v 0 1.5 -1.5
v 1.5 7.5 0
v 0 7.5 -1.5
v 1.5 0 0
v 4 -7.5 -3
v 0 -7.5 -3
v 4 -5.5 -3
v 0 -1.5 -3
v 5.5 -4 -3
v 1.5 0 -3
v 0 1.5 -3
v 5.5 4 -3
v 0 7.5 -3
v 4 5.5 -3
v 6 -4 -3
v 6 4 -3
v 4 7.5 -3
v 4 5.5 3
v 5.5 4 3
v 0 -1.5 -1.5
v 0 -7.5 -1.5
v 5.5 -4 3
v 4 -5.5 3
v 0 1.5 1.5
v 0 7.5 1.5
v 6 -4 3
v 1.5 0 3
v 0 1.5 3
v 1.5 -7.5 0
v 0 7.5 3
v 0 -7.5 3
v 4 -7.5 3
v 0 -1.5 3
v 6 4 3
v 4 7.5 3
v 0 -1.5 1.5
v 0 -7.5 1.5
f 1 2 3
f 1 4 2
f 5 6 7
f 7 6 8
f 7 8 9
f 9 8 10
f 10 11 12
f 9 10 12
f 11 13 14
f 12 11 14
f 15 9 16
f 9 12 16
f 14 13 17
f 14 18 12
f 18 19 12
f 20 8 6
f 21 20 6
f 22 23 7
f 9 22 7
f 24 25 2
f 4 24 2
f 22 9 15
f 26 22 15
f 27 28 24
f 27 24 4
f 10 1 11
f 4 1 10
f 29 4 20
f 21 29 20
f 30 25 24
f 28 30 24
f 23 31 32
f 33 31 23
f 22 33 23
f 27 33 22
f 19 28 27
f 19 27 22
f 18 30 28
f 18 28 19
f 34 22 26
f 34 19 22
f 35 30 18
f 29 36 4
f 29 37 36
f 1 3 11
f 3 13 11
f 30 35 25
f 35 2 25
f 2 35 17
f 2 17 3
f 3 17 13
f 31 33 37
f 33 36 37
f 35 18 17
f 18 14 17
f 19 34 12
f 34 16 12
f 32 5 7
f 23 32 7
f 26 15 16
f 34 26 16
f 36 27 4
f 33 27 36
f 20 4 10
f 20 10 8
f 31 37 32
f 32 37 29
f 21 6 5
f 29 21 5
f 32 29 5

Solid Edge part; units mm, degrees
sketch "Sketch1" plane through (0, 0, 0) normal (0, 0, 1) x (1, 0, 0)
  line L0 (0, 7.5) -> (0, -7.5)
  line L1 (0, -7.5) -> (4, -7.5)
  line L2 (4, -7.5) -> (4, -4)
  line L3 (4, -4) -> (6, -4)
  line L4 (6, -4) -> (6, 4)
  line L5 (6, 4) -> (4, 4)
  line L6 (4, 4) -> (4, 7.5)
  line L7 (4, 7.5) -> (0, 7.5)
  dimension "D1" = 15
  dimension "D2" = 8
  dimension "D3" = 4
  dimension "D4" = 2
extrude "Protrusion1" add sketch "Sketch1" along normal mid plane 6
sketch "Sketch2" plane through (2, -7.5, 0) normal (0, -1, 0) x (1, 0, 0)
  line L0 (-2, -1.5) -> (-2, 1.5)
  line L1 (-2, 1.5) -> (-0.5, 0)
  line L2 (-0.5, 0) -> (-2, -1.5)
  dimension "D1" = 3
extrude "Cutout1" cut sketch "Sketch2" against normal up to next
sketch "Sketch3" plane through (6, 0, 3) normal (0, 0, 1) x (1, 0, 0)
  line L0 (-6, 1.5) -> (-4.5, 0)
  line L1 (-4.5, 0) -> (-6, -1.5)
  line L2 (-6, -1.5) -> (-6, 1.5)
  dimension "D1" = 3
extrude "Cutout2" cut sketch "Sketch3" against normal through all
chamfer "Chamfer_1" distance 1.5 angle 45 2 edges at (4, -4, 0) (4, 4, 0)
properties material "Polyethylene, low density"
